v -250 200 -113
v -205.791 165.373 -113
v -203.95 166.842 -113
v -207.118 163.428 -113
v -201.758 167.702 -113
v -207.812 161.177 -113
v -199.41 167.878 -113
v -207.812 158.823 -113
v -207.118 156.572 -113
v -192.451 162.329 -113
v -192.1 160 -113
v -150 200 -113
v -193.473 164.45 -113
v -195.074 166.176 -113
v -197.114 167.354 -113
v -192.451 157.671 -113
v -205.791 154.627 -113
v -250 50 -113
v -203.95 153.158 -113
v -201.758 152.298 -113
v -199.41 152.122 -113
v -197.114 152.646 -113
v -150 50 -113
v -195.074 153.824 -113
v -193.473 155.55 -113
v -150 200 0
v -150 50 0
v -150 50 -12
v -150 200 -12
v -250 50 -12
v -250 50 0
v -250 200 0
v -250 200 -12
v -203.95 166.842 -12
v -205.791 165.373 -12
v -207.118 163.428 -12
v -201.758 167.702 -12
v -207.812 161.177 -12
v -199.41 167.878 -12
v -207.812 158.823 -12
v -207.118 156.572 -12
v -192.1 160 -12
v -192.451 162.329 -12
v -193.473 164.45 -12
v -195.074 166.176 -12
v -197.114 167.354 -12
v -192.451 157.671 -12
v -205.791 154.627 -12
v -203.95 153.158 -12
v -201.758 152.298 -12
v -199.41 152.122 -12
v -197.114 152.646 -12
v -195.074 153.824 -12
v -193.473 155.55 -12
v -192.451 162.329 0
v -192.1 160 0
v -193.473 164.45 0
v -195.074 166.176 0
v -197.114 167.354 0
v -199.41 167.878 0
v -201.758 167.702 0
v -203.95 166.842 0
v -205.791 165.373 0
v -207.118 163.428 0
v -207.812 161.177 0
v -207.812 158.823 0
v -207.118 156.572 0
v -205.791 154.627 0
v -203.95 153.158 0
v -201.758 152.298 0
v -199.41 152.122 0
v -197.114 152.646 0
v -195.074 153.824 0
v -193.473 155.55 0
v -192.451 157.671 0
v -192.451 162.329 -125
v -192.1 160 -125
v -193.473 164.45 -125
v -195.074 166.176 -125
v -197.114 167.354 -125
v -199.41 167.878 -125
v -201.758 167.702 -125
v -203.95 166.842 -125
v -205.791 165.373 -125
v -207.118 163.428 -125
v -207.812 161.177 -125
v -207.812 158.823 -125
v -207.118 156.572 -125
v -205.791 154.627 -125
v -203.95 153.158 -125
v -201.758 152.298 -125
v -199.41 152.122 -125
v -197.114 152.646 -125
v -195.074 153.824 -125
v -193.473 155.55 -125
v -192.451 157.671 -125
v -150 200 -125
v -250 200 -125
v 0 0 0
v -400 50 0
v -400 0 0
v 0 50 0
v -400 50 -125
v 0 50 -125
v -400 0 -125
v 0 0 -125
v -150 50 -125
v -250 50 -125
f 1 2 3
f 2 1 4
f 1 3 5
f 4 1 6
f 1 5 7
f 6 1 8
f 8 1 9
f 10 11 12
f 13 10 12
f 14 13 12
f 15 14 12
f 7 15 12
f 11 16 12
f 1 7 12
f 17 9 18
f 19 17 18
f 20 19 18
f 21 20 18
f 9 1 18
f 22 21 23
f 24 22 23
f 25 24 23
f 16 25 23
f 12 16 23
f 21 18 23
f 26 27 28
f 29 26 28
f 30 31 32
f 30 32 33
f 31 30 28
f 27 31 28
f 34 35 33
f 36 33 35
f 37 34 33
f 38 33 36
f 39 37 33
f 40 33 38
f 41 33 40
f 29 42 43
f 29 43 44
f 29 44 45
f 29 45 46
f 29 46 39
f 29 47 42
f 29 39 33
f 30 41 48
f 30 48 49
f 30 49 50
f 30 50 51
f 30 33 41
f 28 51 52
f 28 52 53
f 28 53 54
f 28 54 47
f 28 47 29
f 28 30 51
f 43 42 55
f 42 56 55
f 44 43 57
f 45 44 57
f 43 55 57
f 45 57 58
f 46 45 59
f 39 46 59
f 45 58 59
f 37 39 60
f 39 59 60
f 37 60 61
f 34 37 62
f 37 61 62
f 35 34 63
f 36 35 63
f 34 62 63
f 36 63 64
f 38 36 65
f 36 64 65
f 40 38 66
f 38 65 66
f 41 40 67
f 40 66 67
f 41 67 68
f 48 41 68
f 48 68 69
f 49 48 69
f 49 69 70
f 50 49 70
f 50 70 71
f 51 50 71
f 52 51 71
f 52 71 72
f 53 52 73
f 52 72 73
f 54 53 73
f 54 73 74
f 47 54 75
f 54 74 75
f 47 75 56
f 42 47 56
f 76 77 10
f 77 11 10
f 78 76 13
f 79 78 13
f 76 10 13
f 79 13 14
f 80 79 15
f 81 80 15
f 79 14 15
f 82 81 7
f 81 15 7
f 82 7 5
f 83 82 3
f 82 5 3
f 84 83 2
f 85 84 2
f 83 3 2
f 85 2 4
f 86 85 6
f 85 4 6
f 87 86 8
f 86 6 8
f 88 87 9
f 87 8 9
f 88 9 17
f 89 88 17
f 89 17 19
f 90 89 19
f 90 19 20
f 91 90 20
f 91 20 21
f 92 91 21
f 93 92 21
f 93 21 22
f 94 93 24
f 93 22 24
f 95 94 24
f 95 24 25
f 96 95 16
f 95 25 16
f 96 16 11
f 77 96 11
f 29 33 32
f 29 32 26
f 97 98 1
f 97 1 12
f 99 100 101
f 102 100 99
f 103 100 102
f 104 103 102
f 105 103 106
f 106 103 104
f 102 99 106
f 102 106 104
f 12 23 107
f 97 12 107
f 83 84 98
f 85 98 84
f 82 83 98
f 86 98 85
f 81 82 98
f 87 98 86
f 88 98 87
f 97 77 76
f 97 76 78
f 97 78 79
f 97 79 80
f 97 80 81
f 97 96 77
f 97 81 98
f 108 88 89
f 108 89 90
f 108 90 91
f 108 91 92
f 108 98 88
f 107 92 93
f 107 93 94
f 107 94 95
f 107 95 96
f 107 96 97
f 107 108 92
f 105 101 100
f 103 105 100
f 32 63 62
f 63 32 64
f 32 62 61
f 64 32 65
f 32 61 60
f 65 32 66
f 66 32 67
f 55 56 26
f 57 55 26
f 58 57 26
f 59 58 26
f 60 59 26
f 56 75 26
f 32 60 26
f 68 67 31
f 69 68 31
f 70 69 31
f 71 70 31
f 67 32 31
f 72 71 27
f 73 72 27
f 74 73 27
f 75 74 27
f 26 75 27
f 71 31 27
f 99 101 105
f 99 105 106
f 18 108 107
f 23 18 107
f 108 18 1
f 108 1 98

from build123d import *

# Parameters (mm, degrees)
SKETCH1_W               = 400
SKETCH1_H               = 50
BOSS_EXTRUDE1_DEPTH     = 125
SKETCH2_W               = 100
SKETCH2_H               = 12
BOSS_EXTRUDE2_DEPTH     = 150
BOSS_EXTRUDE2_2_DEPTH   = 150
SKETCH3_R               = 7.9
CUT_EXTRUDE1_DEPTH      = 1
CUT_EXTRUDE1_DEPTH_BACK = 126


with BuildPart() as part:
    # Sketch1 → Boss-Extrude1 (new body)
    with BuildSketch(Plane.XY):
        with Locations((-200, 25)):
            Rectangle(SKETCH1_W, SKETCH1_H)
    extrude(amount=-BOSS_EXTRUDE1_DEPTH)


with BuildPart() as body_2:
    # Sketch2 → Boss-Extrude2 (new body)
    with BuildSketch(Plane(origin=(0, 50, 0), x_dir=(1, 0, 0), z_dir=(0, 1, 0))):
        with Locations((-200, 6)):
            Rectangle(SKETCH2_W, SKETCH2_H)
    extrude(amount=BOSS_EXTRUDE2_DEPTH)


with BuildPart() as body_3:
    # Sketch2 → Boss-Extrude2 2 (new body)
    with BuildSketch(Plane(origin=(0, 50, 0), x_dir=(1, 0, 0), z_dir=(0, 1, 0))):
        with Locations((-200, 119)):
            Rectangle(SKETCH2_W, SKETCH2_H)
    extrude(amount=BOSS_EXTRUDE2_2_DEPTH)


with BuildPart() as cut_extrude1_tool:
    # Sketch3 → Cut-Extrude1 (new body, two sides)
    with BuildSketch(Plane.XY) as cut_extrude1_sk:
        with Locations((-200, 160)):
            Circle(SKETCH3_R)
    extrude(amount=CUT_EXTRUDE1_DEPTH)
    extrude(cut_extrude1_sk.sketch, amount=-CUT_EXTRUDE1_DEPTH_BACK)


with BuildPart() as body_2_1:
    add(body_2.part)

    # Cut-Extrude1: cut by cut_extrude1_tool
    add(cut_extrude1_tool.part, mode=Mode.SUBTRACT)


with BuildPart() as body_3_1:
    add(body_3.part)

    # Cut-Extrude1: cut by cut_extrude1_tool
    add(cut_extrude1_tool.part, mode=Mode.SUBTRACT)


solid = Compound([part.part, body_2_1.part, body_3_1.part])
